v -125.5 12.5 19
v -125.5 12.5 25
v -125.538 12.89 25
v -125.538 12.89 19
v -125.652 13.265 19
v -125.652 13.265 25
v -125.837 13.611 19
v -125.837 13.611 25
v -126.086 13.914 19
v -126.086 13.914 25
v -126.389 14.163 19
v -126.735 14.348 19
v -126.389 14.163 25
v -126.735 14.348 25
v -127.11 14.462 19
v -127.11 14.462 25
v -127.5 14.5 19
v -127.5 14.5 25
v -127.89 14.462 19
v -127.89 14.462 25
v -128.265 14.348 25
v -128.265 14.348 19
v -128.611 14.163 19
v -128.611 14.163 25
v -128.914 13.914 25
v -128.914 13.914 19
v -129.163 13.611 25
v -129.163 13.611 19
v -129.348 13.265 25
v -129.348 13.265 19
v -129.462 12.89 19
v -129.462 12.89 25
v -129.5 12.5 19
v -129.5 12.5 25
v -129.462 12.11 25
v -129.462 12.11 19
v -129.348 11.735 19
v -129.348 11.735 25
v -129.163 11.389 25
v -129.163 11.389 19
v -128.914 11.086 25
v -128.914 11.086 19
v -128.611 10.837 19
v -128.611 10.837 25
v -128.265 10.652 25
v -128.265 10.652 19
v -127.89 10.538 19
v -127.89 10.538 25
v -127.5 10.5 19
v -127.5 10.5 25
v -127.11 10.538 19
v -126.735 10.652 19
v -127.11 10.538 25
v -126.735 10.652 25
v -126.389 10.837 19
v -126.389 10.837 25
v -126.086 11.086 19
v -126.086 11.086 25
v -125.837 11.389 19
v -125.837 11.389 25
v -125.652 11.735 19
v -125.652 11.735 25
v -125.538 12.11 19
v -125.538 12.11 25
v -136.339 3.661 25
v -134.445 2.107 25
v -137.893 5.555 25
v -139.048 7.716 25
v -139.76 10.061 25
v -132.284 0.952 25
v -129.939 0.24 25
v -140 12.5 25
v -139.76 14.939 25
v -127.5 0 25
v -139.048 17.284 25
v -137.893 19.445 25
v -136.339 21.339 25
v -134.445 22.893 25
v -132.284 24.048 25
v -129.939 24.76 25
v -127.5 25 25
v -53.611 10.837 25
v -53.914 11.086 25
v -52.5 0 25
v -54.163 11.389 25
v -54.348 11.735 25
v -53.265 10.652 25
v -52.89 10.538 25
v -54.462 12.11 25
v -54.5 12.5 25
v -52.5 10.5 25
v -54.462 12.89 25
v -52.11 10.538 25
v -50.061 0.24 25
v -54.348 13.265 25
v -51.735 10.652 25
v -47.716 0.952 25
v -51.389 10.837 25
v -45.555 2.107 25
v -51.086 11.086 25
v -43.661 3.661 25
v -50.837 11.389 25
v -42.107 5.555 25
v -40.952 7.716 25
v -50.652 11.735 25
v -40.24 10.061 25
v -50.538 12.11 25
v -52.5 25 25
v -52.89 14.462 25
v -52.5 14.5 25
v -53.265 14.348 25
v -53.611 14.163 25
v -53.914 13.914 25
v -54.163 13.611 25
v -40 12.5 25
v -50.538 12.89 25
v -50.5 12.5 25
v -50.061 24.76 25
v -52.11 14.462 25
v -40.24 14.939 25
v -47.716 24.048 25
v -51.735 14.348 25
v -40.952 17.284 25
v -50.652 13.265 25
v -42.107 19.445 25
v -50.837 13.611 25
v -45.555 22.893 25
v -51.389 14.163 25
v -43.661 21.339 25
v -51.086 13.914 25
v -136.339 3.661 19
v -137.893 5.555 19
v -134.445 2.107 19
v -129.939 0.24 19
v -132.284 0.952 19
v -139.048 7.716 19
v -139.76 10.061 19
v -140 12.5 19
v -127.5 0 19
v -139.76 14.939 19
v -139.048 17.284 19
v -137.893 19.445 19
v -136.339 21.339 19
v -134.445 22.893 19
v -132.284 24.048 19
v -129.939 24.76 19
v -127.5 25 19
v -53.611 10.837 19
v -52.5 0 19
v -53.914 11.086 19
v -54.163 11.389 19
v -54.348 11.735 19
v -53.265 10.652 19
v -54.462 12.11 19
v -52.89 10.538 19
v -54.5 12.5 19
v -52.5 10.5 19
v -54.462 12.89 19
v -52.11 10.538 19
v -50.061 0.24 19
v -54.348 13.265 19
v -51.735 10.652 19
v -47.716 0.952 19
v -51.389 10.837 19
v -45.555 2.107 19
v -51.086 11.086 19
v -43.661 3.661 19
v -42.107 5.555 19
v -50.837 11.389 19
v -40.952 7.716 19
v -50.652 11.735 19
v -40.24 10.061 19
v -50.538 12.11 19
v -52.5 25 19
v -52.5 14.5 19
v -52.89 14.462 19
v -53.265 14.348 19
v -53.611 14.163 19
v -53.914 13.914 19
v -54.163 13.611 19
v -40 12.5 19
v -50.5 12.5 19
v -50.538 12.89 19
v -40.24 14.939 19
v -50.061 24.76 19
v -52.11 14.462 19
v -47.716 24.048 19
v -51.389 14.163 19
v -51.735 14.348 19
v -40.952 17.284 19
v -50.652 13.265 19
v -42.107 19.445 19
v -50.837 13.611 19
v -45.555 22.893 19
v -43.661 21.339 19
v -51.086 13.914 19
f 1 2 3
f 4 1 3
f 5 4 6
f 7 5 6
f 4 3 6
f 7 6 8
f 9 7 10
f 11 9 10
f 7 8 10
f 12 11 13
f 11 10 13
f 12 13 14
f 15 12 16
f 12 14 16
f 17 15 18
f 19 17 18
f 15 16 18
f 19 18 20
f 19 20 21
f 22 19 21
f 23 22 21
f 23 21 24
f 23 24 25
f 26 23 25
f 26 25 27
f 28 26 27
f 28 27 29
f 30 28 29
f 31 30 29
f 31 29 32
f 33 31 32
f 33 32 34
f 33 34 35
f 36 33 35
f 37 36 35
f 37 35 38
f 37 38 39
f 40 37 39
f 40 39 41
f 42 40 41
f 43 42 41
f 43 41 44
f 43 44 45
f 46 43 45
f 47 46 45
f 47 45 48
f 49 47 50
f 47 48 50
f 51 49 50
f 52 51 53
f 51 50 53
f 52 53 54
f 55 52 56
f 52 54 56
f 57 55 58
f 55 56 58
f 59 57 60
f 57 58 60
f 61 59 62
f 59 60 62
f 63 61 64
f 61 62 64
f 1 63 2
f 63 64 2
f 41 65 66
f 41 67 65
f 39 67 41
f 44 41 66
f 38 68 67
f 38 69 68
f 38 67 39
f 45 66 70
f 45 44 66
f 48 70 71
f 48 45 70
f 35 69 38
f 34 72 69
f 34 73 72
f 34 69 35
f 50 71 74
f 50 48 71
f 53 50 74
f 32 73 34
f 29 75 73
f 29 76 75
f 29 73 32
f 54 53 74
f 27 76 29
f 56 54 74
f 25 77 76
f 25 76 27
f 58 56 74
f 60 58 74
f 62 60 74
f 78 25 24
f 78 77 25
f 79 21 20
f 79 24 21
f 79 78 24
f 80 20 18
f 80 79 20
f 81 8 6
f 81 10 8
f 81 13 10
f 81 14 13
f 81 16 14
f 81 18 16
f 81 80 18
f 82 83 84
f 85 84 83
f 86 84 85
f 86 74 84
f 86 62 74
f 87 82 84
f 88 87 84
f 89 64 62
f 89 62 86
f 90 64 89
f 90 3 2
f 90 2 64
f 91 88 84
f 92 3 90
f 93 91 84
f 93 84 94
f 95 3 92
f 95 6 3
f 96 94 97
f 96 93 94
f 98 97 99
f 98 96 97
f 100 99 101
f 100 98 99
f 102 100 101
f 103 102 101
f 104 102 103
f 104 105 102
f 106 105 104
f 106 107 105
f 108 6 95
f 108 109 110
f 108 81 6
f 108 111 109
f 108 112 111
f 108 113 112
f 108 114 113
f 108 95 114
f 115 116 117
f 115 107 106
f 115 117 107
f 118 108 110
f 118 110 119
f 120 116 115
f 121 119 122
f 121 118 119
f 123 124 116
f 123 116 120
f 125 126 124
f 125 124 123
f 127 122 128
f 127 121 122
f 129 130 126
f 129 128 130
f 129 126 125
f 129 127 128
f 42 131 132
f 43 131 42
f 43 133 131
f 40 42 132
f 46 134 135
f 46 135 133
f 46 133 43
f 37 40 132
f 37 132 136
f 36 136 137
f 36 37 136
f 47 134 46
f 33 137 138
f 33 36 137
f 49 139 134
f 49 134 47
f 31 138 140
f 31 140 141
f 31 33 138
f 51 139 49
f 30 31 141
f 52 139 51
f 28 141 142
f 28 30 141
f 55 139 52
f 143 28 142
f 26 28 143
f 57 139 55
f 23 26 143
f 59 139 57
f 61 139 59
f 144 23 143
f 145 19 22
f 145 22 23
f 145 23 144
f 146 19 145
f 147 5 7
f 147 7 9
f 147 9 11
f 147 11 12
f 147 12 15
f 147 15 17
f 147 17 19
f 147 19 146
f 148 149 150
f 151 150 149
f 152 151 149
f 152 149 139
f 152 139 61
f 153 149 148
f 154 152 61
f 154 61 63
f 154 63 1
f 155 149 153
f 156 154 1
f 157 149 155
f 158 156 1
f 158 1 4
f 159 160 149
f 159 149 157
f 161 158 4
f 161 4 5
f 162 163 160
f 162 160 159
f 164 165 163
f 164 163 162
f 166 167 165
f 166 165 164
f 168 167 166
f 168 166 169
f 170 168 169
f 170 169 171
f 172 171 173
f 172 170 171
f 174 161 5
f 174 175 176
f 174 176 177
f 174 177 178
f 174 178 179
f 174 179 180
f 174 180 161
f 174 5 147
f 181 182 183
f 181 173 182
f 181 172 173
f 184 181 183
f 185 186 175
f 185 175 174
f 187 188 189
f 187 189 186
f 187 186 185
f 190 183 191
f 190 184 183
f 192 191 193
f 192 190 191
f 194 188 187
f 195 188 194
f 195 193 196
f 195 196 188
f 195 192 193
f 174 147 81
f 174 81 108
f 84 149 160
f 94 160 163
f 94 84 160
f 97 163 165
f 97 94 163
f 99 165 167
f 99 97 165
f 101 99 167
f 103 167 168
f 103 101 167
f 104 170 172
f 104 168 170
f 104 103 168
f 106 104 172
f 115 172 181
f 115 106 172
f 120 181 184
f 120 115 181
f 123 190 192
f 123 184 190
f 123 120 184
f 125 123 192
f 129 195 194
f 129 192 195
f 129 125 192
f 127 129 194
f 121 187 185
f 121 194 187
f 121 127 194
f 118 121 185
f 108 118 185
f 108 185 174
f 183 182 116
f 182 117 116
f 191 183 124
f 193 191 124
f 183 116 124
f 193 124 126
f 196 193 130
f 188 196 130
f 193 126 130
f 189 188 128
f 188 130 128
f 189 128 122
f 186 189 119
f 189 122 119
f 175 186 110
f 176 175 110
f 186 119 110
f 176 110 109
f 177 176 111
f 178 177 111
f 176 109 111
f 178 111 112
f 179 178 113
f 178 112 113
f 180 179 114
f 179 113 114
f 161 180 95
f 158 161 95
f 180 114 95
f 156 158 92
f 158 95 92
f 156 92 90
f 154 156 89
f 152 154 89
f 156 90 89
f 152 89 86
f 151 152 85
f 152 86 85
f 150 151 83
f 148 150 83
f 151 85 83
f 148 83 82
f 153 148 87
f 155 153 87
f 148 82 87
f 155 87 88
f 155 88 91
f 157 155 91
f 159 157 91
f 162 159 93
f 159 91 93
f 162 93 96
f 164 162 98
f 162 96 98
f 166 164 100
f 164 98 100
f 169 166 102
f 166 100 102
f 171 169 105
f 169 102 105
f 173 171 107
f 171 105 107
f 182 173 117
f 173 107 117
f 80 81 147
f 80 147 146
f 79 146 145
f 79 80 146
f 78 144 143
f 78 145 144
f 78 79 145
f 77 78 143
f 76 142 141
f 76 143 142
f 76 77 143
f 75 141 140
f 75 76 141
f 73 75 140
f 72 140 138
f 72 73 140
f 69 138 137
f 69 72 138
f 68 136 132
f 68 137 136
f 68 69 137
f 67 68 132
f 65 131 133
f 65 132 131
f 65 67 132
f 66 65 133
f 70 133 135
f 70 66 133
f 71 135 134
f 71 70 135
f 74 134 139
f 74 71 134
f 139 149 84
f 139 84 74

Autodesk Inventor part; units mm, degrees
ref_plane "YZ Plane" through (0, 0, 0) normal (1, 0, 0) x (0, 1, 0)
ref_plane "XZ Plane" through (0, 0, 0) normal (0, 1, 0) x (-1, 0, 0)
ref_plane "XY Plane" through (0, 0, 0) normal (0, 0, 1) x (1, 0, 0)
sketch "Sketch1" plane through (0, 0, 0) normal (0, 0, 1) x (1, 0, 0)
  line L0 (0, 0) -> (-140, 0)
  line L1 (-140, 0) -> (-140, 25)
  line L2 (-140, 25) -> (0, 25)
  line L3 (0, 25) -> (0, 0)
  dimension "d0" = 140
  dimension "d1" = 25
extrude "Extrusion1" add sketch "Sketch1" along normal blind 25
sketch "Sketch4" plane through (0, 0, 25) normal (0, 0, 1) x (1, 0, 0)
  point P0 (0, 0)
sketch "Sketch5" plane through (0, 0, 25) normal (0, 0, 1) x (1, 0, 0)
  line L0 (0, 25) -> (-140, 25) projected
  line L1 (0, 0) -> (-40, 0)
  line L2 (-40, 0) -> (-40, 25)
  line L3 (-40, 25) -> (0, 25)
  line L4 (0, 25) -> (0, 0)
  dimension "d16" = 40
extrude "Extrusion4" cut sketch "Sketch5" against normal blind 100
sketch "Sketch6" plane through (-40, 0, 25) normal (1, 0, 0) x (0, 0, -1)
  line L0 (25, 25) -> (0, 25) projected
  line L1 (25, 0) -> (6, 0)
  line L2 (6, 0) -> (6, 25)
  line L3 (6, 25) -> (25, 25)
  line L4 (25, 25) -> (25, 0)
  dimension "d19" = 19
extrude "Extrusion5" cut sketch "Sketch6" against normal blind 100
sketch "Sketch7" plane through (0, 0, 25) normal (0, 0, 1) x (1, 0, 0)
  circle A0 centre (-52.5, 12.5) radius 12.5
  circle A1 centre (-127.5, 12.5) radius 12.5
  line L0 (-40, 0) -> (-40, 25) projected
  line L1 (-140, 0) -> (-40, 0) projected
  line L2 (-140, 25) -> (-140, 0) projected
  circle A2 centre (-127.5, 12.5) radius 2
  circle A3 centre (-52.5, 12.5) radius 2
  line L3 (-40, 25) -> (-140, 25) projected
  point P0 (0, 0)
  point P1 (-52.5, 25)
  point P2 (-40, 12.5)
  point P3 (-52.5, 0)
  point P4 (-127.5, 25)
  point P5 (-140, 12.5)
  point P6 (-127.5, 0)
  dimension "d22" = 25
  dimension "d23" = 25
  dimension "d24" = 12.5
  dimension "d25" = 12.5
  dimension "d26" = 12.5
  dimension "d27" = 12.5
  dimension "d28" = 4
  dimension "d29" = 4
extrude "Extrusion6" cut sketch "Sketch7" against normal blind 100 contours L0 L1 A0 | A0 L3 L0 | A1 L2 L3 | L1 L2 A1 | A2 | A3
properties part number "Large Rod"
